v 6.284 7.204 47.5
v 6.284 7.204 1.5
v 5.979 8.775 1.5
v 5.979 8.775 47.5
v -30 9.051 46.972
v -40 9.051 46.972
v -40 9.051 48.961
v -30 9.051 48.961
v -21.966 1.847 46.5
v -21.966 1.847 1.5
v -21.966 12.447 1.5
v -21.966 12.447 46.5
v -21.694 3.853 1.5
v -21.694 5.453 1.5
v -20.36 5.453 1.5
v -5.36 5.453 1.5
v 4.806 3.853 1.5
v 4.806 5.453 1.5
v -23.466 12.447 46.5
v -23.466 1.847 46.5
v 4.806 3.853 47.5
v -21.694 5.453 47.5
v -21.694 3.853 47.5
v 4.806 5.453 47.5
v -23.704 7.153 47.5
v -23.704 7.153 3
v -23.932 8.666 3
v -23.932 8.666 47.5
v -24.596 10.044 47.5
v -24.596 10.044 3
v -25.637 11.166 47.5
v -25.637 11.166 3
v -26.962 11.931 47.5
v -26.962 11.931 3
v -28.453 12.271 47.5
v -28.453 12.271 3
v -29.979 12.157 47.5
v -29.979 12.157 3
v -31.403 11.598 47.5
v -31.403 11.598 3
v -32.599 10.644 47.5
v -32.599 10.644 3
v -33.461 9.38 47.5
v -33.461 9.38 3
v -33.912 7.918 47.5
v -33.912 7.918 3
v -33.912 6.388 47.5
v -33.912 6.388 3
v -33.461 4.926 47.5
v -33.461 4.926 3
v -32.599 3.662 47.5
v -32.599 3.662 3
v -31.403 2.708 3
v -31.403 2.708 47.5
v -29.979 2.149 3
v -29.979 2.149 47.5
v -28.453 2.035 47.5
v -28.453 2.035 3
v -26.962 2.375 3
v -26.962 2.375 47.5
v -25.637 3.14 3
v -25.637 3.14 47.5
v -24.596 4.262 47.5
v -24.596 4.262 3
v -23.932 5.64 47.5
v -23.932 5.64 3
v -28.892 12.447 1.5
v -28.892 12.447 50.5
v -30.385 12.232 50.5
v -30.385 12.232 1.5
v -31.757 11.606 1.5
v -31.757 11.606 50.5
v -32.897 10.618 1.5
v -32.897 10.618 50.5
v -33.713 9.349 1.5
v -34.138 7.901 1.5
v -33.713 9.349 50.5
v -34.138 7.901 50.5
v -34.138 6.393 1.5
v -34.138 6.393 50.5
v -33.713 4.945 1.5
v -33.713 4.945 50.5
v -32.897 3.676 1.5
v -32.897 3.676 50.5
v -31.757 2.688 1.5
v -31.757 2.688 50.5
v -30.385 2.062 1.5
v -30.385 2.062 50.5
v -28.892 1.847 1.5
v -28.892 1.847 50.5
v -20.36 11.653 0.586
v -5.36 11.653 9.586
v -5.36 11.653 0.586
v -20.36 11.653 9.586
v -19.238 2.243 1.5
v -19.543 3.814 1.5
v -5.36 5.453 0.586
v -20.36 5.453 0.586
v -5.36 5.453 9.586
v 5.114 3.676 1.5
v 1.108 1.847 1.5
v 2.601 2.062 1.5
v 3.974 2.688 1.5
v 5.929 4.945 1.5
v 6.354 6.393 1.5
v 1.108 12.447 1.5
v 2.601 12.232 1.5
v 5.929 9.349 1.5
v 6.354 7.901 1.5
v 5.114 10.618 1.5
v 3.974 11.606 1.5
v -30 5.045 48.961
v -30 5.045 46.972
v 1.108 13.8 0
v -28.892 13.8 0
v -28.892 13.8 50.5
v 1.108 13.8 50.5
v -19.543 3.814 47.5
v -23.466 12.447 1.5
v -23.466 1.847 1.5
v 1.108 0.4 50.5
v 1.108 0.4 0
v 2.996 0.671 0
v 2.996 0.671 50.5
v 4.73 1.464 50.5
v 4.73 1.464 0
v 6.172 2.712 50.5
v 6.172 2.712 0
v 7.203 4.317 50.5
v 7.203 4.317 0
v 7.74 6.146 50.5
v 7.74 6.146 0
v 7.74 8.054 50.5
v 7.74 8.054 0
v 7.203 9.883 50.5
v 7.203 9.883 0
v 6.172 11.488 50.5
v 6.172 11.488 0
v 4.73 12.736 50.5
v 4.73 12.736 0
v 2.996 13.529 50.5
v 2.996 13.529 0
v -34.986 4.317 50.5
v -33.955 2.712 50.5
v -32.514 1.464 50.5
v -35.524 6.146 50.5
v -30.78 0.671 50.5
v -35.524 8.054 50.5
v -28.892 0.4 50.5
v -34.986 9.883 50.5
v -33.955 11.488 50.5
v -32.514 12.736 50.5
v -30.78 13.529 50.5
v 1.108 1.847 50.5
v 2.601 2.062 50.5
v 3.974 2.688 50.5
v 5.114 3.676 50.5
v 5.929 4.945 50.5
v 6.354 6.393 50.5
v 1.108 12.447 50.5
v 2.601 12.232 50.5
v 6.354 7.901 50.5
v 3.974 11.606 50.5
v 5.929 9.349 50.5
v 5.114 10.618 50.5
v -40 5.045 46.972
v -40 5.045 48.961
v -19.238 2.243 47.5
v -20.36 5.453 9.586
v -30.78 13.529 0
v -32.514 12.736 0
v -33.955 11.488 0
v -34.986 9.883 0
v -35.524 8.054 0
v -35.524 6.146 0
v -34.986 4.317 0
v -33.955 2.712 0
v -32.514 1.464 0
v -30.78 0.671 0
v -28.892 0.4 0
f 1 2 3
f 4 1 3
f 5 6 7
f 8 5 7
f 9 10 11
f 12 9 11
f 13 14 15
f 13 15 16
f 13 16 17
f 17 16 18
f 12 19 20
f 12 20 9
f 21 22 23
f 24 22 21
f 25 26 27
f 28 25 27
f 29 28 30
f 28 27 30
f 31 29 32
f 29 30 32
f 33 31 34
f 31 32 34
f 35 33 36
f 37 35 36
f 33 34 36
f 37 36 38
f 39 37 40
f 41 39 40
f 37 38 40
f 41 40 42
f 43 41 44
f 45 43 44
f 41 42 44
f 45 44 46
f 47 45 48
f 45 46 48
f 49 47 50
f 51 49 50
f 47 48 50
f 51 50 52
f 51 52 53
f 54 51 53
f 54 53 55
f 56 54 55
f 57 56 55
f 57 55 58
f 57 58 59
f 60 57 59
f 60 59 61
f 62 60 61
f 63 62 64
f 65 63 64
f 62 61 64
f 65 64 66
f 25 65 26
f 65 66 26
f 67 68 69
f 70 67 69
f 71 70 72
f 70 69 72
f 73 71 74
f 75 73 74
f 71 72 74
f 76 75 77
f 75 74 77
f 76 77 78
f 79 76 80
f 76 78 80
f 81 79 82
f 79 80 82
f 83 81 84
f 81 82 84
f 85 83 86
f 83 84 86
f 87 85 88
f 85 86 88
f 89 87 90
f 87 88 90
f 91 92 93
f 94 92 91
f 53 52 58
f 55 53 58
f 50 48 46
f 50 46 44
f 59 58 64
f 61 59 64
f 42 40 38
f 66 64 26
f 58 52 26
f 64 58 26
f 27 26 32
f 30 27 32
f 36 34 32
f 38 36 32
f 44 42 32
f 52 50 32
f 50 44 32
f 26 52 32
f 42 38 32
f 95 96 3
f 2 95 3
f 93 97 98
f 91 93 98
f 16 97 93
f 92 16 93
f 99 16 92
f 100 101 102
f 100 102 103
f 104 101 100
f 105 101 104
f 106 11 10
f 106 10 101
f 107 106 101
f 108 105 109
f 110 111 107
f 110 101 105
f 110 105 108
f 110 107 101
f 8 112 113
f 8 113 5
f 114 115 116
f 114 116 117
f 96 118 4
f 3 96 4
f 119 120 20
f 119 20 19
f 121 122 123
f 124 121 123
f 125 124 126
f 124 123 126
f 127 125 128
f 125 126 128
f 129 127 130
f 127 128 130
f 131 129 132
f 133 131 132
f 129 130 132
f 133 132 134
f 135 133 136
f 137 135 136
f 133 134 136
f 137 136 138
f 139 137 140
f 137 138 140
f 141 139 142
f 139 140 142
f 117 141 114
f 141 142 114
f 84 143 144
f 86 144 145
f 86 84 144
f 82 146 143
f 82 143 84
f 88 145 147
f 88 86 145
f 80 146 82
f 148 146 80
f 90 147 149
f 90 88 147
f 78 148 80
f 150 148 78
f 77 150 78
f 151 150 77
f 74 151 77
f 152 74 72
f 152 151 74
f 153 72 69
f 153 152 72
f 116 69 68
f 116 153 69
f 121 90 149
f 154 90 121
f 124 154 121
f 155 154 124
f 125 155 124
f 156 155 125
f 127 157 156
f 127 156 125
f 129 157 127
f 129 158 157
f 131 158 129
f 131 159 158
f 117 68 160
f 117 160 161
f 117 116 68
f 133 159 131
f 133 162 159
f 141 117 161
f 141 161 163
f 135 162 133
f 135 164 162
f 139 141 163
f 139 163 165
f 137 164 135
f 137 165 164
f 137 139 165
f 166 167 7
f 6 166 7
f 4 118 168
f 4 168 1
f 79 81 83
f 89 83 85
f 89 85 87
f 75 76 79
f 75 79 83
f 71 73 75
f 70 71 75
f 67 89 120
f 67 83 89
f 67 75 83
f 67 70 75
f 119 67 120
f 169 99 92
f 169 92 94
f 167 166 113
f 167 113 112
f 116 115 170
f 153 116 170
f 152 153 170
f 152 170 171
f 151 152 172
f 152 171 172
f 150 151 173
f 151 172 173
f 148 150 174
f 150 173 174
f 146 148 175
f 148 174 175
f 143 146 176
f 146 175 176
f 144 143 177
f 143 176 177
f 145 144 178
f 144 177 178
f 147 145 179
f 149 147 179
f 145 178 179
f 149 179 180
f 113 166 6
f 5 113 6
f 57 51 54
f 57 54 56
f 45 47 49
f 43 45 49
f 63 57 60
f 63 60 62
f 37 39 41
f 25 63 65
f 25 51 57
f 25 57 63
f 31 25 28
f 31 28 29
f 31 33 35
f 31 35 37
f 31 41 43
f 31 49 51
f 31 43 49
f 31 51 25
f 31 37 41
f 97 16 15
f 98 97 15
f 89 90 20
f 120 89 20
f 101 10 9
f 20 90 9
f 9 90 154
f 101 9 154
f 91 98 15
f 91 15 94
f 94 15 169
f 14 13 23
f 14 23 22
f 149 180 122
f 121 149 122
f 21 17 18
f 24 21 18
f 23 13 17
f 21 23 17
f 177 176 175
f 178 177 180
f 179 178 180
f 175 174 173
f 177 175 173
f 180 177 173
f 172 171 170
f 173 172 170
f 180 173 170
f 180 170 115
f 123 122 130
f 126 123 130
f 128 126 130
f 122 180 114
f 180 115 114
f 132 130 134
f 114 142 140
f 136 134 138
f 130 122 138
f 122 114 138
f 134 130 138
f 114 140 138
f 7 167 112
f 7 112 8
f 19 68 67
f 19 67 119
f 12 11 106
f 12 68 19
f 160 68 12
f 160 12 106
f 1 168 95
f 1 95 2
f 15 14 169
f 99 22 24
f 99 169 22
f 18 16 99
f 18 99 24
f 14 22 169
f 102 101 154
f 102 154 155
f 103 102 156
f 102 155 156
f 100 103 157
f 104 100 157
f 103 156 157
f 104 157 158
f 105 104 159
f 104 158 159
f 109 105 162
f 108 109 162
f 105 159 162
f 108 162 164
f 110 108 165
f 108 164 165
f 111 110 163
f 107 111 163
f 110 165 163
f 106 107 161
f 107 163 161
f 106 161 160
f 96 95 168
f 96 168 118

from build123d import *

# Parameters (mm, degrees)
SKETCH003_R     = 5.13266
PAD002_DEPTH    = 44.5
SKETCH004_W     = 26
SKETCH004_H     = 1.6
PAD003_DEPTH    = 46
SKETCH002_W     = 26.5
SKETCH002_H     = 1.6
PAD001_DEPTH    = 46
SKETCH006_W     = 15
SKETCH006_H     = 9
PAD005_DEPTH    = 6.2
SKETCH008_W     = 4.006802
SKETCH008_H     = 1.988987
PAD006_DEPTH    = 10
PAD_DEPTH       = 50.5
POCKET_DEPTH    = 49
SKETCH005_W     = 1.5
SKETCH005_H     = 10.6
PAD004_DEPTH    = 45
POCKET001_DEPTH = 0.1


with BuildPart() as pad002:
    # Sketch003 → Pad002 (new body)
    with BuildSketch(Plane.XY.offset(3)):
        with Locations((-28.836864, 7.153081)):
            Circle(SKETCH003_R)
    extrude(amount=PAD002_DEPTH)


with BuildPart() as pcb001:
    # Sketch004 → Pad003 (new body)
    with BuildSketch(Plane(origin=(2.5, 2.5, 1.5), x_dir=(0.981627, 0.190809, 0), z_dir=(0, 0, 1))):
        with Locations((-8.387676, 4.695807)):
            Rectangle(SKETCH004_W, SKETCH004_H)
    extrude(amount=PAD003_DEPTH)


with BuildPart() as pad005:
    # Sketch002 → Pad001 (new body)
    with BuildSketch(Plane.XY.offset(1.5)):
        with Locations((-8.444172, 4.652804)):
            Rectangle(SKETCH002_W, SKETCH002_H)
    extrude(amount=PAD001_DEPTH)

    # Sketch006 → Pad005 (new body)
    with BuildSketch(Plane(origin=(0, 5.452804, 1.5), x_dir=(-1, 0, 0), z_dir=(0, 1, 0))):
        with Locations((12.860087, 3.586113)):
            Rectangle(SKETCH006_W, SKETCH006_H)
    extrude(amount=PAD005_DEPTH)


with BuildPart() as pad006:
    # Sketch008 → Pad006 (new body)
    with BuildSketch(Plane.YZ.offset(-40)):
        with Locations((7.047933, 47.966302)):
            Rectangle(SKETCH008_W, SKETCH008_H)
    extrude(amount=PAD006_DEPTH)


with BuildPart() as pocket001:
    # Sketch → Pad (new body)
    with BuildSketch(Plane.XY):
        with BuildLine():
            ThreePointArc((-28.891959, 13.8), (-35.591959, 7.1), (-28.891959, 0.4))
            Line((-28.891959, 0.4), (1.108041, 0.4))
            ThreePointArc((1.108041, 0.4), (7.808041, 7.1), (1.108041, 13.8))
            Line((-28.891959, 13.8), (1.108041, 13.8))
        make_face()
    extrude(amount=PAD_DEPTH)

    # Sketch001 → Pocket (cut)
    with BuildSketch(Plane.XY.offset(50.5)):
        with BuildLine():
            ThreePointArc((-28.891825, 12.446886), (-34.191825, 7.146886), (-28.891825, 1.846886))
            Line((-28.891825, 1.846886), (1.108175, 1.846886))
            ThreePointArc((1.108175, 1.846886), (6.408175, 7.146886), (1.108175, 12.446886))
            Line((-28.891825, 12.446886), (1.108175, 12.446886))
        make_face()
    extrude(amount=-POCKET_DEPTH, mode=Mode.SUBTRACT)

    # Sketch005 → Pad004 (new body)
    with BuildSketch(Plane.XY.offset(1.5)):
        with Locations((-22.716125, 7.146886)):
            Rectangle(SKETCH005_W, SKETCH005_H)
    extrude(amount=PAD004_DEPTH)

    # Sketch011 → Pocket001 (cut)
    with BuildSketch(Plane.XZ.offset(-0.4)):
        Polygon((14.793986, -20.792818), (13.411034, -26.935513), (12.621883, -26.171735), (11.94296, -25.207525), (11.08545, -24.097188), (8.452741, -23.958813), (8.422468, -24.490499), (8.834792, -24.988598), (9.825957, -25.924281), (13.210079, -28.957981), (15.030163, -30.315768), (16.969824, -31.495613), (18.235936, -31.987684), (18.888622, -32.003044), (19.523693, -31.731931), (21.591777, -30.604874), (23.505606, -29.241662), (26.977621, -26.063349), (28.961779, -23.940885), (29.851076, -22.79651), (30.589569, -21.645668), (28.135459, -22.505372), (25.746597, -23.625963), (23.588796, -23.88511), (21.406931, -23.953982), (20.88194, -23.958284), (20.646882, -24.000019), (18.514561, -28.91311), (18.132936, -27.761468), (17.905202, -26.442973), (16.987348, -21.373109), (16.562578, -18.735981), (15.918144, -15.191777), align=None)
        Polygon((24.885442, -9.044156), (23.226489, -9.234893), (21.639737, -9.74272), (20.181279, -10.546771), (18.907225, -11.626168), (18.478836, -11.940664), (18.069752, -11.605503), (16.476297, -10.276901), (14.585337, -9.434502), (12.536602, -9.07988), (10.469822, -9.214593), (8.868519, -9.954583), (7.506169, -11.055596), (6.399945, -12.427805), (5.567025, -13.981367), (5.187227, -14.999311), (5.058423, -16.074702), (5.180349, -18.254911), (5.924106, -20.528477), (7.100912, -22.617368), (7.718313, -22.952134), (8.416316, -23.06212), (9.854623, -23.107228), (11.685653, -23.179563), (12.903034, -25.098662), (15.740468, -11.887011), (16.193658, -13.299948), (16.49075, -14.877858), (18.766652, -26.831701), (19.457033, -25.023303), (20.058454, -23.179563), (25.368728, -22.965416), (28.213029, -21.597066), (31.158393, -20.479002), (31.768165, -18.425168), (31.939442, -16.295144), (31.881271, -15.106143), (31.532531, -13.97897), (30.34979, -11.912878), (29.276868, -10.718805), (27.967111, -9.80201), (26.48261, -9.223474), align=None)
    extrude(amount=-POCKET001_DEPTH, mode=Mode.SUBTRACT)


solid = Compound([pad002.part, pcb001.part, pad005.part, pad006.part, pocket001.part])
